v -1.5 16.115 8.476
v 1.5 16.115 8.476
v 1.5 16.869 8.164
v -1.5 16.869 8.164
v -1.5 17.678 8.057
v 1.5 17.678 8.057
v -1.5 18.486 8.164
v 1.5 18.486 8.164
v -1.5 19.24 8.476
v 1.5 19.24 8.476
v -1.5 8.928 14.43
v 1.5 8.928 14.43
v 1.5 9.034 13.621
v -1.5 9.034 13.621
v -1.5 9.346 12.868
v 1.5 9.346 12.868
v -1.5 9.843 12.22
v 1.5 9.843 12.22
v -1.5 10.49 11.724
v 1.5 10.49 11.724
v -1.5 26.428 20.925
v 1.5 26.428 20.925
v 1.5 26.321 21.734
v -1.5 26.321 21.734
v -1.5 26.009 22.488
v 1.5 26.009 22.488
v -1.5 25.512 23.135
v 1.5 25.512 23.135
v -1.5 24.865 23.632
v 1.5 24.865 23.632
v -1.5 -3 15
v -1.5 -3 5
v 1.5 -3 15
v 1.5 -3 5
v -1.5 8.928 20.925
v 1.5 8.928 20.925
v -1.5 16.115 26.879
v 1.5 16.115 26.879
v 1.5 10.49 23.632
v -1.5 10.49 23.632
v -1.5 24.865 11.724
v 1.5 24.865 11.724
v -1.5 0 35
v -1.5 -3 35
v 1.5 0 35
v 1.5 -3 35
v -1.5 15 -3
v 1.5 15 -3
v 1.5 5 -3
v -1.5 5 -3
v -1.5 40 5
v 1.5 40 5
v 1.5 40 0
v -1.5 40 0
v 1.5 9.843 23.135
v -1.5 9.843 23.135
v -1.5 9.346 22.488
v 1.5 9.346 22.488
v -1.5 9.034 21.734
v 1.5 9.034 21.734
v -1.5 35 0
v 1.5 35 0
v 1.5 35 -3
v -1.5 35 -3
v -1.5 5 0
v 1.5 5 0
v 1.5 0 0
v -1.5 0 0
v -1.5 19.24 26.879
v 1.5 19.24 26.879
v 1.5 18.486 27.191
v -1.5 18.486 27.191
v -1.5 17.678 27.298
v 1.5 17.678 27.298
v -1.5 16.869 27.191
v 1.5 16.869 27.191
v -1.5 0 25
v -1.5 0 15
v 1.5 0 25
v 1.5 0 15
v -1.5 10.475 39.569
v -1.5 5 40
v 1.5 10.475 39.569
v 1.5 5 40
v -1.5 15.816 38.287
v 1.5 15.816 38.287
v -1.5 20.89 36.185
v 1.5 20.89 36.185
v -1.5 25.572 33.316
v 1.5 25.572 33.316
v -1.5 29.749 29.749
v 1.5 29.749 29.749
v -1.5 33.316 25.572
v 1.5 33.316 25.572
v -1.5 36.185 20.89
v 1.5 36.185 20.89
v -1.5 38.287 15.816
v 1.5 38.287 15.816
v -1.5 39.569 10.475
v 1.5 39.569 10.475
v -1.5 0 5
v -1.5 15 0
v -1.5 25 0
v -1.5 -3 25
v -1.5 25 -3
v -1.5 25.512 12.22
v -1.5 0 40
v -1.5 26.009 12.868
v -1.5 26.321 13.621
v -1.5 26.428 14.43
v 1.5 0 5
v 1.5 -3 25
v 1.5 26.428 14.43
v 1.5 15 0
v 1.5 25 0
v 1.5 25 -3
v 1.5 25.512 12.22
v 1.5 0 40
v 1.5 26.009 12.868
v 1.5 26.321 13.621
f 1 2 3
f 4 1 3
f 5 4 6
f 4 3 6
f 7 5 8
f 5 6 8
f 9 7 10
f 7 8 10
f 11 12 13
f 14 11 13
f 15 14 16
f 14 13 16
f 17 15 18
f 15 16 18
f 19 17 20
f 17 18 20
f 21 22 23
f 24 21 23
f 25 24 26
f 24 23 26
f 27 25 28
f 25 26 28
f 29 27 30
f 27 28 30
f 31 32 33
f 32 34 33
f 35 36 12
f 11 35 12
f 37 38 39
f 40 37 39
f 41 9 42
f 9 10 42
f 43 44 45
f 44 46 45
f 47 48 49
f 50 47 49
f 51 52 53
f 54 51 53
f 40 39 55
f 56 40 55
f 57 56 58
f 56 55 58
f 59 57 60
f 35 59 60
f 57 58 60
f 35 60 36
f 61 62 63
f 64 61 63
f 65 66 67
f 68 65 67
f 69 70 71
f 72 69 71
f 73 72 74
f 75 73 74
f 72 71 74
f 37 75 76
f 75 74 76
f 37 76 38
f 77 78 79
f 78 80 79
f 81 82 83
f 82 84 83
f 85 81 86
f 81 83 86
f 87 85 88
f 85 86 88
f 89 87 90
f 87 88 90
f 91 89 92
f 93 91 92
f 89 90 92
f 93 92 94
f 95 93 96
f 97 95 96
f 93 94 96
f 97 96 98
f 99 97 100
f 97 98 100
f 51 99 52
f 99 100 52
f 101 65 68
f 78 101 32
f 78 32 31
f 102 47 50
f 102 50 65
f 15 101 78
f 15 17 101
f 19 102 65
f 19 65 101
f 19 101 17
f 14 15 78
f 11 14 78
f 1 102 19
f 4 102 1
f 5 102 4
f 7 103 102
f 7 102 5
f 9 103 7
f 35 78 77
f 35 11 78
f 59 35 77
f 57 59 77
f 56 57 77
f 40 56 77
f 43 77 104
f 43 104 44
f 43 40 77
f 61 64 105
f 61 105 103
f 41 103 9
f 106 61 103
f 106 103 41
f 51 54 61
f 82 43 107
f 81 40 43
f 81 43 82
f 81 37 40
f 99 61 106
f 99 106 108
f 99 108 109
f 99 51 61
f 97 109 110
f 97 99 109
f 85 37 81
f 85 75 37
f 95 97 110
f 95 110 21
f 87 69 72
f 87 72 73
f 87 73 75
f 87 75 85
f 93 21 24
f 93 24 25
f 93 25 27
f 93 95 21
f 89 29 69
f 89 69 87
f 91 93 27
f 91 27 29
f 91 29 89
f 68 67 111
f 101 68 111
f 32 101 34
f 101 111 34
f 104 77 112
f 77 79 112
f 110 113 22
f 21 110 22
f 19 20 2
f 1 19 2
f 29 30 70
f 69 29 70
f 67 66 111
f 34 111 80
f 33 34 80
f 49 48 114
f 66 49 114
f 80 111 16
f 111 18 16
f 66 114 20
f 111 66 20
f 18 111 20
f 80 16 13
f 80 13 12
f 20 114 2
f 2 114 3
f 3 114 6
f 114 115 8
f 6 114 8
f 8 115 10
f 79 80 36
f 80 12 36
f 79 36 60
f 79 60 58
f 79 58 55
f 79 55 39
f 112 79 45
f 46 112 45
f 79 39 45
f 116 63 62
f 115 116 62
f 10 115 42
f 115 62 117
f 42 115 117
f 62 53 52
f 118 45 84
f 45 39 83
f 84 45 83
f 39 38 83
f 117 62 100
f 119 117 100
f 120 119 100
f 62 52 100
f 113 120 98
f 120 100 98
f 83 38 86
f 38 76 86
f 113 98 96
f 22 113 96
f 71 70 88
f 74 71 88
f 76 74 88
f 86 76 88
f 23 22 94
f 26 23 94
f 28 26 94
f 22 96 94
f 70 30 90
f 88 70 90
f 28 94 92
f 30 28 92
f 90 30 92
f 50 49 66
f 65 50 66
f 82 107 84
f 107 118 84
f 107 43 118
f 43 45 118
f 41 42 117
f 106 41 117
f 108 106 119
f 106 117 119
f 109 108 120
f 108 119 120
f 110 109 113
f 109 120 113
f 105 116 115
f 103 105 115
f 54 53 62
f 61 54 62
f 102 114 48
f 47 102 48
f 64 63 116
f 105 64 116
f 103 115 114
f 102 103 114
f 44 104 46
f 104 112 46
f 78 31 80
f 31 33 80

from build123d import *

# Parameters (mm, degrees)
BOSS_EXTRUDE1_DEPTH = 1.5


with BuildPart() as part:
    # Sketch1 → Boss-Extrude1 (new, symmetric)
    with BuildSketch(Plane(origin=(0, 0, 0), x_dir=(0, 0, -1), z_dir=(1, 0, 0))):
        with BuildLine():
            Line((0, 0), (-5, 0))
            Line((-5, 0), (-5, -3))
            Line((-5, -3), (-15, -3))
            Line((-15, -3), (-15, 0))
            Line((-15, 0), (-25, 0))
            Line((-25, 0), (-25, -3))
            Line((-25, -3), (-35, -3))
            Line((-35, -3), (-35, 0))
            Line((-35, 0), (-40, 0))
            Line((-40, 0), (-40, 5))
            ThreePointArc((-40, 5), (-29.748737342, 29.748737342), (-5, 40))
            Line((-5, 40), (0, 40))
            Line((0, 40), (0, 35))
            Line((0, 35), (3, 35))
            Line((3, 35), (3, 25))
            Line((3, 25), (0, 25))
            Line((0, 25), (0, 15))
            Line((0, 15), (3, 15))
            Line((3, 15), (3, 5))
            Line((3, 5), (0, 5))
            Line((0, 5), (0, 0))
        make_face()
        with BuildLine():
            Line((-8.476149614, 19.24016953), (-11.723744879, 24.86516953))
            ThreePointArc((-11.723744879, 24.86516953), (-12.867574265, 26.008998916), (-14.430074265, 26.42766953))
            Line((-14.430074265, 26.42766953), (-20.925264794, 26.42766953))
            ThreePointArc((-20.925264794, 26.42766953), (-22.487764794, 26.008998916), (-23.631594181, 24.86516953))
            Line((-23.631594181, 24.86516953), (-26.879189445, 19.24016953))
            ThreePointArc((-26.879189445, 19.24016953), (-27.297860058, 17.67766953), (-26.879189445, 16.11516953))
            Line((-26.879189445, 16.11516953), (-23.631594181, 10.49016953))
            ThreePointArc((-23.631594181, 10.49016953), (-22.487764794, 9.346340143), (-20.925264794, 8.92766953))
            Line((-20.925264794, 8.92766953), (-14.430074265, 8.92766953))
            ThreePointArc((-14.430074265, 8.92766953), (-12.867574265, 9.346340143), (-11.723744879, 10.49016953))
            Line((-11.723744879, 10.49016953), (-8.476149614, 16.11516953))
            ThreePointArc((-8.476149614, 16.11516953), (-8.057479001, 17.67766953), (-8.476149614, 19.24016953))
        make_face(mode=Mode.SUBTRACT)
    extrude(amount=BOSS_EXTRUDE1_DEPTH, both=True)


solid = part.part
